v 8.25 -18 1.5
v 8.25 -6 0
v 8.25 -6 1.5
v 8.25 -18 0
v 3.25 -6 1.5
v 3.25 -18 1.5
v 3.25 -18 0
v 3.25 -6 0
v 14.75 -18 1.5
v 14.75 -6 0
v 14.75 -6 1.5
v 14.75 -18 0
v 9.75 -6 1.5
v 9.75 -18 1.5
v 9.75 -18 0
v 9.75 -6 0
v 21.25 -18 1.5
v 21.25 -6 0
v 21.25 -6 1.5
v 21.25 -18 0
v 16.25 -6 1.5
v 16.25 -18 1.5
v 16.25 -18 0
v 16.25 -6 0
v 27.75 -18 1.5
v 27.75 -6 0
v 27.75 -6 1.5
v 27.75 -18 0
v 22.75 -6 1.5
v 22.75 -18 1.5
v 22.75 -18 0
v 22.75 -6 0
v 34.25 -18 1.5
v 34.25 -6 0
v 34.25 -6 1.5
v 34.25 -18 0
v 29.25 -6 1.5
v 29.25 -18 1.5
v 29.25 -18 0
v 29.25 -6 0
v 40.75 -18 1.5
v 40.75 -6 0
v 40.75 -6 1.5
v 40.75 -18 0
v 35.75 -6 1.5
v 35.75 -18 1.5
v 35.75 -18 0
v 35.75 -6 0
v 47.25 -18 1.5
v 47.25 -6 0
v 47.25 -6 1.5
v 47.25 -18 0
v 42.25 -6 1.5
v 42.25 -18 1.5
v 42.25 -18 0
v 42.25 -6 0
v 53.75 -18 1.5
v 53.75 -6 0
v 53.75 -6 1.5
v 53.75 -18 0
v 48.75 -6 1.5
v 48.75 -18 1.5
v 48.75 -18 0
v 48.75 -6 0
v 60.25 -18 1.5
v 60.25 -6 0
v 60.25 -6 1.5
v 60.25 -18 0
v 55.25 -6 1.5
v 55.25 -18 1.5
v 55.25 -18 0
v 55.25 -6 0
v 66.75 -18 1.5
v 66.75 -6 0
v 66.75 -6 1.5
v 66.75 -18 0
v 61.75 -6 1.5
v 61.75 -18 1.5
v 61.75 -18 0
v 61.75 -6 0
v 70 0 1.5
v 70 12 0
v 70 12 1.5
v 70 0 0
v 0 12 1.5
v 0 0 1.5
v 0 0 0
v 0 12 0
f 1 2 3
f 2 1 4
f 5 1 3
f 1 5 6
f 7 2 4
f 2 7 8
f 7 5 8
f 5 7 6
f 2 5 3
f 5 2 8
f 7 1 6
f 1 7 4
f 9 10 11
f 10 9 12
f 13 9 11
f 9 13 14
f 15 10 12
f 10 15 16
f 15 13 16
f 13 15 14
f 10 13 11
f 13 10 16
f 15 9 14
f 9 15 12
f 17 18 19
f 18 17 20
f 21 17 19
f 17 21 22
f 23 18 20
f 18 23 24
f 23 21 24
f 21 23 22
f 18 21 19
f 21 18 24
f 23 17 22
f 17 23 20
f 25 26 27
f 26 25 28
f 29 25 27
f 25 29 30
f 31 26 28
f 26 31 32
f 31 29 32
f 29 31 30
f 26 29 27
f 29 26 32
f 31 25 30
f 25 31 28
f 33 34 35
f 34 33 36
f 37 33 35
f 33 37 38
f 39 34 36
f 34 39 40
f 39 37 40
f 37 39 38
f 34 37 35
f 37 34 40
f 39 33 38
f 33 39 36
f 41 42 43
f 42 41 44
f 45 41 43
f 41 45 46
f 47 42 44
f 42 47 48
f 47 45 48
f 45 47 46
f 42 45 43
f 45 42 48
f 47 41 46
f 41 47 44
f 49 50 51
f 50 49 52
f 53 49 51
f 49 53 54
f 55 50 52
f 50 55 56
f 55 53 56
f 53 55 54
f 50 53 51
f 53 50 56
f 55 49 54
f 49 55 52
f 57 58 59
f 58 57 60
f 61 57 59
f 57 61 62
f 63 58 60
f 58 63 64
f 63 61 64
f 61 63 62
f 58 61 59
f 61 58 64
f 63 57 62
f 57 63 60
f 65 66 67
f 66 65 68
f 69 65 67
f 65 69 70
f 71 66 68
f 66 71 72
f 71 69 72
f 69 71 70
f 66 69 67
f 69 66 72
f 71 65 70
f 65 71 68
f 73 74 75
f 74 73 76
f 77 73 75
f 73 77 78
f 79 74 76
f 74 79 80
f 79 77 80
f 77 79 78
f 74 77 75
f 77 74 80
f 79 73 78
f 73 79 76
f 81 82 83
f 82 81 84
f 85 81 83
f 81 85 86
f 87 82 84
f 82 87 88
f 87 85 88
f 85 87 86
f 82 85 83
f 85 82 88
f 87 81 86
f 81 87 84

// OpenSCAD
// 10-well Agarose Gel Comb
// Designed for FDM printing, lying flat on the XY plane (Z=0).
// Dimensions in millimetres.

// --- Dimensions ---
$fn = 128; // High resolution for smooth edges

// Spine dimensions
SPINE_LENGTH = 70;   // X dimension
SPINE_WIDTH = 12;    // Y dimension
SPINE_THICKNESS = 1.5; // Z dimension

// Tooth dimensions
TOOTH_WIDTH = 5.0;   // X dimension
TOOTH_LENGTH = 12;   // Y dimension (extends from spine edge)
TOOTH_COUNT = 10;
TOOTH_GAP = 1.5;     // Gap between teeth

// --- Calculations ---
// Total width of the tooth row
TOOTH_ROW_WIDTH = (TOOTH_COUNT * TOOTH_WIDTH) + ((TOOTH_COUNT - 1) * TOOTH_GAP);

// Offset to center the tooth row on the spine in X
X_OFFSET = (SPINE_LENGTH - TOOTH_ROW_WIDTH) / 2;

// Position of the spine edge from which teeth hang (-Y direction)
// Spine is centered in Y, so edge is at -SPINE_WIDTH/2
SPINE_EDGE_Y = -SPINE_WIDTH / 2;

// --- Main Construction ---
// We create the full solid (Spine + Teeth) first, then cut the gaps.
union() {
    // 1. Create the Spine
    translate([0, 0, 0])
        cube([SPINE_LENGTH, SPINE_WIDTH, SPINE_THICKNESS]);

    // 2. Create the Teeth attached to the spine
    // We add them to the union so they become one solid piece
    for (i = [0 : TOOTH_COUNT - 1]) {
        // Calculate X position for this tooth
        current_x = X_OFFSET + (i * (TOOTH_WIDTH + TOOTH_GAP));
        
        // Calculate Y position for this tooth
        // Starts at the spine edge (SPINE_EDGE_Y) and extends in -Y direction
        current_y = SPINE_EDGE_Y - TOOTH_LENGTH;
        
        translate([current_x, current_y, 0])
            cube([TOOTH_WIDTH, TOOTH_LENGTH, SPINE_THICKNESS]);
    }
}

// --- Cut the Gaps (Wells) ---
// We subtract the gaps between teeth.
// We extend the cut slightly (0.1mm) to ensure clean separation and no thin walls.
difference() {
    // The solid created above is implicitly referenced if we wrap it, 
    // but since we used union() above, we need to recreate the solid here 
    // or use a variable. To keep it self-contained and robust without variables 
    // that might confuse the difference context, we recreate the solid shape 
    // and subtract the gaps from it.
    
    // Recreate the full solid for the difference operation
    union() {
        translate([0, 0, 0])
            cube([SPINE_LENGTH, SPINE_WIDTH, SPINE_THICKNESS]);
        
        for (i = [0 : TOOTH_COUNT - 1]) {
            current_x = X_OFFSET + (i * (TOOTH_WIDTH + TOOTH_GAP));
            current_y = SPINE_EDGE_Y - TOOTH_LENGTH;
            
            translate([current_x, current_y, 0])
                cube([TOOTH_WIDTH, TOOTH_LENGTH, SPINE_THICKNESS]);
        }
    }
    
    // Subtract the gaps between teeth
    for (i = [0 : TOOTH_COUNT - 2]) {
        // Calculate X position of the gap
        gap_x = X_OFFSET + (i * (TOOTH_WIDTH + TOOTH_GAP)) + TOOTH_WIDTH;
        
        // Gap dimensions
        gap_width = TOOTH_GAP;
        gap_length = TOOTH_LENGTH;
        
        // Cut slightly past the faces to ensure separation
        translate([gap_x, SPINE_EDGE_Y - TOOTH_LENGTH, 0])
            cube([gap_width + 0.1, gap_length + 0.1, SPINE_THICKNESS + 0.1]);
    }
}
